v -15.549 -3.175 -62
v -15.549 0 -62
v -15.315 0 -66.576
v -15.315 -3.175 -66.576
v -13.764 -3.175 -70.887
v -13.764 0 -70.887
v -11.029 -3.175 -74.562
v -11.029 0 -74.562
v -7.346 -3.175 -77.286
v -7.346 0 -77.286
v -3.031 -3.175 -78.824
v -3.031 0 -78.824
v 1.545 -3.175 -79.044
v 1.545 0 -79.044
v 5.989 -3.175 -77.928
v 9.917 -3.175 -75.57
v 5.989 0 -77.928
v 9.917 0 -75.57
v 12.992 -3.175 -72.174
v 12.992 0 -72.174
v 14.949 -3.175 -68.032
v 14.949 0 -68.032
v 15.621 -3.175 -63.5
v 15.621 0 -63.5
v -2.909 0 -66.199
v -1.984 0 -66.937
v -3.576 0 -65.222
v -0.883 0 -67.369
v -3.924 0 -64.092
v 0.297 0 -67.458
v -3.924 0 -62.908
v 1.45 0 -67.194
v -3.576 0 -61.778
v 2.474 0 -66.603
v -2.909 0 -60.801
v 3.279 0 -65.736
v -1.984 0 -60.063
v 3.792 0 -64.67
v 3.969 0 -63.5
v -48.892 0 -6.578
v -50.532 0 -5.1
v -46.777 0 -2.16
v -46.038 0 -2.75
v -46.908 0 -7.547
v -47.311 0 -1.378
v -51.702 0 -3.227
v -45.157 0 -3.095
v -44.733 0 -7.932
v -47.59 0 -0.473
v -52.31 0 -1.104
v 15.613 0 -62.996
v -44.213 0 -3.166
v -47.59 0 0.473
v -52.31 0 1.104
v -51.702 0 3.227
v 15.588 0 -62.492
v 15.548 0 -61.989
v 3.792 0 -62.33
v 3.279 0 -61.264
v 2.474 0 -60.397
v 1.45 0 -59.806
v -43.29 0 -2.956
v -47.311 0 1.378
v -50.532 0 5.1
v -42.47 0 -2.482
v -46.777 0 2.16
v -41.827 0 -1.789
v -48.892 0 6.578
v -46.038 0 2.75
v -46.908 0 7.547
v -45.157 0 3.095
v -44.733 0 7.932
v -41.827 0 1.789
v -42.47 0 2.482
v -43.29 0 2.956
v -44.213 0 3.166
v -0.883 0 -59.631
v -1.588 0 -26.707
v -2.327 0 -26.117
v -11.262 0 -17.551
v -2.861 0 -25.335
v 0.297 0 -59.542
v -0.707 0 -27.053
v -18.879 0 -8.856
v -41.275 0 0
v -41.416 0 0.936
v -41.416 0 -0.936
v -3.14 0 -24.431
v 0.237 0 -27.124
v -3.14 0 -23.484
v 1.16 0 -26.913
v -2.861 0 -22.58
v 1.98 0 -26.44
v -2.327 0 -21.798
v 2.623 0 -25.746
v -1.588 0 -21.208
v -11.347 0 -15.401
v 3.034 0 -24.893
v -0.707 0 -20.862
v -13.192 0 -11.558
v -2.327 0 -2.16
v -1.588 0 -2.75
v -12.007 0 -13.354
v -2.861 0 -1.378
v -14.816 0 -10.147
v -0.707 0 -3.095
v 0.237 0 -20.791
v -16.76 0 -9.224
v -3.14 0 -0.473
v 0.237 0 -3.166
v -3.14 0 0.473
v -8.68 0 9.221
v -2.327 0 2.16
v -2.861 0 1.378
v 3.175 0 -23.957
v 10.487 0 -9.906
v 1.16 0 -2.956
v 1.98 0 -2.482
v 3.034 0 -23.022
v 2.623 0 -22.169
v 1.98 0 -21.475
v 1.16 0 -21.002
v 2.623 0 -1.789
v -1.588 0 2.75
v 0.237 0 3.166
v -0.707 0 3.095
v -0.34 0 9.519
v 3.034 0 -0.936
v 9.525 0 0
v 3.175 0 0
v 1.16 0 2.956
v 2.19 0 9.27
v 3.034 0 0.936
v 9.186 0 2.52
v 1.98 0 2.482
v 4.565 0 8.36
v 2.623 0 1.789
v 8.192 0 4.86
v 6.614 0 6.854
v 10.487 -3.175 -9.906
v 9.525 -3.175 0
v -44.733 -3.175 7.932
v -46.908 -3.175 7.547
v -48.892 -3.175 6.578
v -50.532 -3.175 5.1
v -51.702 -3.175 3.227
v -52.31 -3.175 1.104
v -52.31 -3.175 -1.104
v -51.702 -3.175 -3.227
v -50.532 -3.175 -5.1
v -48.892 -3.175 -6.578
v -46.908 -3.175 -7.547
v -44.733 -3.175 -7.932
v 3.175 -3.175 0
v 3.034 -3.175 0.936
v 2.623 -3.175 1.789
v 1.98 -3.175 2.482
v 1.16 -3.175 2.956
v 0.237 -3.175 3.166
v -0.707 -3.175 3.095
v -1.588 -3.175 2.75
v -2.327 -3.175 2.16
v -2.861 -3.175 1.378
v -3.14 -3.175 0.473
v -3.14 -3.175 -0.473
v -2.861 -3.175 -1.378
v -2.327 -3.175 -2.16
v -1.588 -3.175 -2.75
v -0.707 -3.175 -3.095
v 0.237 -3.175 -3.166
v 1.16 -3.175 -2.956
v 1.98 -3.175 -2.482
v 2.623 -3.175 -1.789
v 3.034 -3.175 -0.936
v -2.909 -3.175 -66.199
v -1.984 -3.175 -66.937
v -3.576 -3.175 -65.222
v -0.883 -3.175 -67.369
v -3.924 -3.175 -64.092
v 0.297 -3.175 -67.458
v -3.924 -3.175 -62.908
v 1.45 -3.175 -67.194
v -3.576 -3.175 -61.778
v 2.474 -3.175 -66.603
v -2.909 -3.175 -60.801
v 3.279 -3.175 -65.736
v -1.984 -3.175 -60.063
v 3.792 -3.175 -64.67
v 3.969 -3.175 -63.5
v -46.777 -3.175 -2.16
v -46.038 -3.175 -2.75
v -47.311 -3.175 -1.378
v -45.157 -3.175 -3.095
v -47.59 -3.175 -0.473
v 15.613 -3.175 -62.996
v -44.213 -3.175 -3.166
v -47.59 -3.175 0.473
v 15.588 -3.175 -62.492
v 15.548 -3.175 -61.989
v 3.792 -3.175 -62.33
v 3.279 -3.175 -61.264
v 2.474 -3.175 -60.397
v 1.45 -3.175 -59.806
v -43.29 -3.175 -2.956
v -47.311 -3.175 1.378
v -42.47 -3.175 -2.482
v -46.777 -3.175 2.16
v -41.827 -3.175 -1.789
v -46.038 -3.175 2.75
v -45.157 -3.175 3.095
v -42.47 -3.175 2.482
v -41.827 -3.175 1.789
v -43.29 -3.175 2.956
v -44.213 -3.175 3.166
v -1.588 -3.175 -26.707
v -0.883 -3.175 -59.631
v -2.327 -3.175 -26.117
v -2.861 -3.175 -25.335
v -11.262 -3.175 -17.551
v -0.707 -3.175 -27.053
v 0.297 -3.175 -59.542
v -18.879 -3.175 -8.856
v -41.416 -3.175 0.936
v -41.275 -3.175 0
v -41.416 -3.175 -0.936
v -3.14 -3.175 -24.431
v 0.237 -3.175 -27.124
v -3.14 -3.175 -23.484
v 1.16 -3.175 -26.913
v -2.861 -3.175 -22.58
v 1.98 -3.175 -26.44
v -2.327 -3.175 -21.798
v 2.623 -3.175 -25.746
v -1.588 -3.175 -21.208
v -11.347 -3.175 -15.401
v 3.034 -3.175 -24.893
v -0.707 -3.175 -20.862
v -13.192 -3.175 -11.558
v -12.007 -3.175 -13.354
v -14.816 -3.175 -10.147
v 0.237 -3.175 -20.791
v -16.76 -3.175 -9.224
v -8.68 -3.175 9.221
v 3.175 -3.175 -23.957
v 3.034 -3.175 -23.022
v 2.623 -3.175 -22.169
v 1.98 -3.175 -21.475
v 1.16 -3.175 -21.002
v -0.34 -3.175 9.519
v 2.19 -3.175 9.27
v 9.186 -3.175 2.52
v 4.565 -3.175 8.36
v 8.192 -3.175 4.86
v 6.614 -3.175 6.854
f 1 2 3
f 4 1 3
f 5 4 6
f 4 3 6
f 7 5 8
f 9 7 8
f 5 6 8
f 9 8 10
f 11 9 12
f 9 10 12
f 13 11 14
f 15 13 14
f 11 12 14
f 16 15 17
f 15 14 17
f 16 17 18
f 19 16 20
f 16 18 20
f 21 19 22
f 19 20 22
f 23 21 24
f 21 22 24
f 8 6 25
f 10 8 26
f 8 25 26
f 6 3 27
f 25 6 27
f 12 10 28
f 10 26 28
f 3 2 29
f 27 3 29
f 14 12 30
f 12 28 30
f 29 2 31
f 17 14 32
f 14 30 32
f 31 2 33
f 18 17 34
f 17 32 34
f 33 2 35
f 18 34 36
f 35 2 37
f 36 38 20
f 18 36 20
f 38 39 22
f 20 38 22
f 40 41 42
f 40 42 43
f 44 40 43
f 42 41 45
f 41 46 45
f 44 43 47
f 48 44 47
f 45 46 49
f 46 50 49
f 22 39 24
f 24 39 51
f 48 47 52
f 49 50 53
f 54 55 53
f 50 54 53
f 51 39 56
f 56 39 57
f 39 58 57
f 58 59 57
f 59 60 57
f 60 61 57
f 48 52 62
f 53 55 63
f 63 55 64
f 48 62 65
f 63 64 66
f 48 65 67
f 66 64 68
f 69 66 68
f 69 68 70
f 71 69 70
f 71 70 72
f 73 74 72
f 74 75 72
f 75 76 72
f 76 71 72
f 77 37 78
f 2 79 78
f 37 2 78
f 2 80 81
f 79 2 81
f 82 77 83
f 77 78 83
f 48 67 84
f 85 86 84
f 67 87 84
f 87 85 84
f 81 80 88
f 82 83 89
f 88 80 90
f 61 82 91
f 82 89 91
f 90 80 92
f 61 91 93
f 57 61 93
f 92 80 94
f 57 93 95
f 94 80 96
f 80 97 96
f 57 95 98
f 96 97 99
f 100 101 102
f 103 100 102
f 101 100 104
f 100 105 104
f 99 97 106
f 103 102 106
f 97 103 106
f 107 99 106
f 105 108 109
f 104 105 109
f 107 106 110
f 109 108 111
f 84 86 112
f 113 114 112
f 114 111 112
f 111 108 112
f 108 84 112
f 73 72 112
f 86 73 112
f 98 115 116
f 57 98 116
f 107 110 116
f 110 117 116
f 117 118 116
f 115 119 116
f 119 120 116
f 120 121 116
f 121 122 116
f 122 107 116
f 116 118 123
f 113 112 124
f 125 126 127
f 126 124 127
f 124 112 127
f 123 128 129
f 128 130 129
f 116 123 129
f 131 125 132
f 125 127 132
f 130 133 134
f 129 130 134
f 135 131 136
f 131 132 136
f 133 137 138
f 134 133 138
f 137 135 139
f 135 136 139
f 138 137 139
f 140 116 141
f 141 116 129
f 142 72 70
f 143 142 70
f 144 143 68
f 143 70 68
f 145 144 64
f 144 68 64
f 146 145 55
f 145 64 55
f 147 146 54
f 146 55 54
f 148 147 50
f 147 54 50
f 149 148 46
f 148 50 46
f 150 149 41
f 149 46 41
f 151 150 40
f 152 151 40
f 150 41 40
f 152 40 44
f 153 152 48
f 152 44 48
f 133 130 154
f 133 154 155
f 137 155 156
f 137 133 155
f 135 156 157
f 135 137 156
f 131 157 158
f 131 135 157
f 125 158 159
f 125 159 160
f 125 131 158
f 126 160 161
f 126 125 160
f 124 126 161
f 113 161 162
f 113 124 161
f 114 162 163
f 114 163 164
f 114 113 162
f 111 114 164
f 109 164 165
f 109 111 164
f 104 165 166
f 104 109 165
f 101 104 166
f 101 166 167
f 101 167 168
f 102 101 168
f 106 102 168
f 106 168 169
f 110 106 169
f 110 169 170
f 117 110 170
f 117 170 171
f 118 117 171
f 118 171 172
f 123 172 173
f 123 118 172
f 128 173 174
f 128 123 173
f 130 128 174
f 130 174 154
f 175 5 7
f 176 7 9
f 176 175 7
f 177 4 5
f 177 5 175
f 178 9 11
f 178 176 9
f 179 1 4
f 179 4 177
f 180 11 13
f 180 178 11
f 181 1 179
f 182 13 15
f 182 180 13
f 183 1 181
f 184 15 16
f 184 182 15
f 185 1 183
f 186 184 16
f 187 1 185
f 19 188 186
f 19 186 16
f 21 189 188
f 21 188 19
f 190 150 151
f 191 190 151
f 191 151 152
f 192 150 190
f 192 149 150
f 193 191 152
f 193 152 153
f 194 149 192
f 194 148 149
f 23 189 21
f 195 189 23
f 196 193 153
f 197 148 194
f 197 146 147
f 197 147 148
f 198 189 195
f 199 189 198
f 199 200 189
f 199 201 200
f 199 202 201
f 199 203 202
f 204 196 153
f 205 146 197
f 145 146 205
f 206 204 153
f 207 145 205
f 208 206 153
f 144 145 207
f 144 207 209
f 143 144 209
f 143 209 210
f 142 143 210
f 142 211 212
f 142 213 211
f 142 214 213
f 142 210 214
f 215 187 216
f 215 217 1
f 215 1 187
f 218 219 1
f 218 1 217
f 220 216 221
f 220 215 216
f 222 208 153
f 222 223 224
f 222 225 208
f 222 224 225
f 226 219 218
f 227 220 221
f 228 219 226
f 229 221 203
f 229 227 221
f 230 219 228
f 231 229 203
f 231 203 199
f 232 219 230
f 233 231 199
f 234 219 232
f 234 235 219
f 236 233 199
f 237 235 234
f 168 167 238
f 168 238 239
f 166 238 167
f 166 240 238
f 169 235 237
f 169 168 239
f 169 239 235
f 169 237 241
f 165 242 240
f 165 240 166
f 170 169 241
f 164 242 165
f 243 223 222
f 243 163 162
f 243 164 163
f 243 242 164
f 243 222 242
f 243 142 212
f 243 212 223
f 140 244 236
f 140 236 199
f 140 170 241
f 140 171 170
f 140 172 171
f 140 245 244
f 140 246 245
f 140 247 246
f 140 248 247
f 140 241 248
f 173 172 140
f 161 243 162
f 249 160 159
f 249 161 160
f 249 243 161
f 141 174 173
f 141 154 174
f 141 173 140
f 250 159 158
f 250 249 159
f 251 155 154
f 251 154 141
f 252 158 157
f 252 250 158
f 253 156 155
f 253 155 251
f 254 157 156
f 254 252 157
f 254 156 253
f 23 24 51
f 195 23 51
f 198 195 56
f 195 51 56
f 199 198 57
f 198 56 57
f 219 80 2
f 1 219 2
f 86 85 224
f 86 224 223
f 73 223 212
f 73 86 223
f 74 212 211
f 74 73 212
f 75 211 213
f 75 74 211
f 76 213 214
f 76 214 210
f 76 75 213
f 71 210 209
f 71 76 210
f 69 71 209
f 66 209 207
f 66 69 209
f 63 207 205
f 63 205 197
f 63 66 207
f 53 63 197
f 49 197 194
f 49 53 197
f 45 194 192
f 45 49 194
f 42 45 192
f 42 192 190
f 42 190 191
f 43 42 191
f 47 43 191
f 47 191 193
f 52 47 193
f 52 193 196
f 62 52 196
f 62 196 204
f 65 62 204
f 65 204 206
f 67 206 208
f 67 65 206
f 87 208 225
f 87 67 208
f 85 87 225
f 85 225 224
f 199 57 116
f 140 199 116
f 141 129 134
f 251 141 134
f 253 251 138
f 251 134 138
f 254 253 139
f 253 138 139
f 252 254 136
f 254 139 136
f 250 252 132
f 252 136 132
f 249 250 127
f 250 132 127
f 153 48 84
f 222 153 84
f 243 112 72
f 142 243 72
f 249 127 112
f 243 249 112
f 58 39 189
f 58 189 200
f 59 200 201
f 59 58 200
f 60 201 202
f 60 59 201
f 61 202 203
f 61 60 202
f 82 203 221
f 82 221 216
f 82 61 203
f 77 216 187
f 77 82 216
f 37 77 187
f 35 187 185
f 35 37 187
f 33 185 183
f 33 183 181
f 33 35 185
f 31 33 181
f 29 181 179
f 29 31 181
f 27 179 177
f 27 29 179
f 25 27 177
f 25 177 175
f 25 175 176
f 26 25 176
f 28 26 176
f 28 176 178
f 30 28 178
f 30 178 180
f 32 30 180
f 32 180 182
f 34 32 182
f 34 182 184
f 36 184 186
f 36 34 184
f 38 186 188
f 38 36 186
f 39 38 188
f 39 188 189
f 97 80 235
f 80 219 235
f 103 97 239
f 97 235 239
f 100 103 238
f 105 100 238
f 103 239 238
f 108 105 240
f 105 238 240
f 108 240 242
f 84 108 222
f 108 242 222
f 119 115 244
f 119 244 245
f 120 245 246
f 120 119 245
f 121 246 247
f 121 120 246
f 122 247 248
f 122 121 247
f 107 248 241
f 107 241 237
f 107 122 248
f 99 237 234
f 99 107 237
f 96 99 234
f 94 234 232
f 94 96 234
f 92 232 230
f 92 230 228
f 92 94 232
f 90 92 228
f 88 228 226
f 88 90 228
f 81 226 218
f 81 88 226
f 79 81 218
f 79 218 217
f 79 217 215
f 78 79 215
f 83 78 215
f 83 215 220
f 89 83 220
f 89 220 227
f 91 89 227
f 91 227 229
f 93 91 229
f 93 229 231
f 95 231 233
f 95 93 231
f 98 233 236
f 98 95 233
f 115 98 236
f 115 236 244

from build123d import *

# Parameters (mm, degrees)
F0_R     = 3.175
F0_R_2   = 3.96875
F1_DEPTH = 3.175
F2_R     = 7.9375


with BuildPart() as f1:
    # F0 (on Front) → F1 (new body)
    with BuildSketch(Plane.XZ):
        with BuildLine():
            ThreePointArc((-0.3401787076, -9.5189234395), (6.6138272887, -6.8544083329), (9.525, 0))
            ThreePointArc((9.525, 0), (6.6138273092, 6.8544083132), (-0.3401786508, 9.5189234415))
            ThreePointArc((-0.3401786508, 9.5189234415), (-6.5286581765, 6.9355783763), (-9.481007181, 0.9144002588))
            ThreePointArc((-9.481007181, 0.9144002588), (-7.164320199, -6.2767938541), (-0.3401787076, -9.5189234395))
        make_face()
        Circle(F0_R, mode=Mode.SUBTRACT)
        with BuildLine():
            Line((10.4874381875, -9.9058708993), (9.525, 0))
            ThreePointArc((9.525, 0), (6.6138272887, -6.8544083329), (-0.3401787076, -9.5189234395))
            Line((-0.3401787076, -9.5189234395), (10.4874381875, -9.9058708993))
        make_face()
        with BuildLine():
            ThreePointArc((-9.481007181, 0.9144002588), (-6.5286581765, 6.9355783763), (-0.3401786508, 9.5189234415))
            Line((-0.3401786508, 9.5189234415), (-8.6798843665, 9.2208866737))
            Line((-8.6798843665, 9.2208866737), (-9.481007181, 0.9144002588))
        make_face()
        with BuildLine():
            Line((-10.4524001899, -9.157542126), (-0.3401787076, -9.5189234395))
            ThreePointArc((-0.3401787076, -9.5189234395), (-7.164320199, -6.2767938541), (-9.481007181, 0.9144002588))
            Line((-9.481007181, 0.9144002588), (-10.4524001899, -9.157542126))
        make_face()
        with BuildLine():
            Line((10.4874381875, -9.9058708993), (-0.3401787076, -9.5189234395))
            Line((-0.3401787076, -9.5189234395), (-10.4524001899, -9.157542126))
            Line((-10.4524001899, -9.157542126), (-15.5488517247, -62.0003830342))
            ThreePointArc((-15.5488517247, -62.0003830342), (-0.0055160109, -47.8790009739), (15.5477887724, -61.9894023403))
            Line((15.5477887724, -61.9894023403), (10.4874381875, -9.9058708993))
        make_face()
        with Locations((0, -23.9574573934)):
            Circle(F0_R, mode=Mode.SUBTRACT)
        with BuildLine():
            Line((-10.4524001899, -9.157542126), (-9.481007181, 0.9144002588))
            Line((-9.481007181, 0.9144002588), (-8.6798843665, 9.2208866737))
            Line((-8.6798843665, 9.2208866737), (-44.7334816061, 7.9324362228))
            ThreePointArc((-44.7334816061, 7.9324362228), (-38.9384770253, 5.7120067182), (-36.5125, 0))
            ThreePointArc((-36.5125, 0), (-38.9384772211, -5.7120069072), (-44.7334821499, -7.9324362034))
            Line((-44.7334821499, -7.9324362034), (-10.4524001899, -9.157542126))
        make_face()
        with BuildLine():
            ThreePointArc((15.621, -63.5), (15.602686458, -62.7438146435), (15.5477887724, -61.9894023403))
            ThreePointArc((15.5477887724, -61.9894023403), (-0.0055160109, -47.8790009739), (-15.5488517247, -62.0003830342))
            ThreePointArc((-15.5488517247, -62.0003830342), (-0.7506757652, -79.1029525057), (15.621, -63.5))
        make_face()
        with Locations((0, -63.5)):
            Circle(F0_R_2, mode=Mode.SUBTRACT)
        with BuildLine():
            ThreePointArc((-36.5125, 0), (-38.9384770253, 5.7120067182), (-44.7334816061, 7.9324362228))
            ThreePointArc((-44.7334816061, 7.9324362228), (-52.3875, 2.721e-07), (-44.7334821499, -7.9324362034))
            ThreePointArc((-44.7334821499, -7.9324362034), (-38.9384772211, -5.7120069072), (-36.5125, 0))
        make_face()
        with Locations((-44.45, 0)):
            Circle(F0_R, mode=Mode.SUBTRACT)
    extrude(amount=F1_DEPTH)

    # F2
    f2_edges = [f1.edges().sort_by_distance(p)[0] for p in [
        (-10.4524, -1.5875, -9.157542),
    ]]
    fillet(f2_edges, radius=F2_R)


solid = f1.part
